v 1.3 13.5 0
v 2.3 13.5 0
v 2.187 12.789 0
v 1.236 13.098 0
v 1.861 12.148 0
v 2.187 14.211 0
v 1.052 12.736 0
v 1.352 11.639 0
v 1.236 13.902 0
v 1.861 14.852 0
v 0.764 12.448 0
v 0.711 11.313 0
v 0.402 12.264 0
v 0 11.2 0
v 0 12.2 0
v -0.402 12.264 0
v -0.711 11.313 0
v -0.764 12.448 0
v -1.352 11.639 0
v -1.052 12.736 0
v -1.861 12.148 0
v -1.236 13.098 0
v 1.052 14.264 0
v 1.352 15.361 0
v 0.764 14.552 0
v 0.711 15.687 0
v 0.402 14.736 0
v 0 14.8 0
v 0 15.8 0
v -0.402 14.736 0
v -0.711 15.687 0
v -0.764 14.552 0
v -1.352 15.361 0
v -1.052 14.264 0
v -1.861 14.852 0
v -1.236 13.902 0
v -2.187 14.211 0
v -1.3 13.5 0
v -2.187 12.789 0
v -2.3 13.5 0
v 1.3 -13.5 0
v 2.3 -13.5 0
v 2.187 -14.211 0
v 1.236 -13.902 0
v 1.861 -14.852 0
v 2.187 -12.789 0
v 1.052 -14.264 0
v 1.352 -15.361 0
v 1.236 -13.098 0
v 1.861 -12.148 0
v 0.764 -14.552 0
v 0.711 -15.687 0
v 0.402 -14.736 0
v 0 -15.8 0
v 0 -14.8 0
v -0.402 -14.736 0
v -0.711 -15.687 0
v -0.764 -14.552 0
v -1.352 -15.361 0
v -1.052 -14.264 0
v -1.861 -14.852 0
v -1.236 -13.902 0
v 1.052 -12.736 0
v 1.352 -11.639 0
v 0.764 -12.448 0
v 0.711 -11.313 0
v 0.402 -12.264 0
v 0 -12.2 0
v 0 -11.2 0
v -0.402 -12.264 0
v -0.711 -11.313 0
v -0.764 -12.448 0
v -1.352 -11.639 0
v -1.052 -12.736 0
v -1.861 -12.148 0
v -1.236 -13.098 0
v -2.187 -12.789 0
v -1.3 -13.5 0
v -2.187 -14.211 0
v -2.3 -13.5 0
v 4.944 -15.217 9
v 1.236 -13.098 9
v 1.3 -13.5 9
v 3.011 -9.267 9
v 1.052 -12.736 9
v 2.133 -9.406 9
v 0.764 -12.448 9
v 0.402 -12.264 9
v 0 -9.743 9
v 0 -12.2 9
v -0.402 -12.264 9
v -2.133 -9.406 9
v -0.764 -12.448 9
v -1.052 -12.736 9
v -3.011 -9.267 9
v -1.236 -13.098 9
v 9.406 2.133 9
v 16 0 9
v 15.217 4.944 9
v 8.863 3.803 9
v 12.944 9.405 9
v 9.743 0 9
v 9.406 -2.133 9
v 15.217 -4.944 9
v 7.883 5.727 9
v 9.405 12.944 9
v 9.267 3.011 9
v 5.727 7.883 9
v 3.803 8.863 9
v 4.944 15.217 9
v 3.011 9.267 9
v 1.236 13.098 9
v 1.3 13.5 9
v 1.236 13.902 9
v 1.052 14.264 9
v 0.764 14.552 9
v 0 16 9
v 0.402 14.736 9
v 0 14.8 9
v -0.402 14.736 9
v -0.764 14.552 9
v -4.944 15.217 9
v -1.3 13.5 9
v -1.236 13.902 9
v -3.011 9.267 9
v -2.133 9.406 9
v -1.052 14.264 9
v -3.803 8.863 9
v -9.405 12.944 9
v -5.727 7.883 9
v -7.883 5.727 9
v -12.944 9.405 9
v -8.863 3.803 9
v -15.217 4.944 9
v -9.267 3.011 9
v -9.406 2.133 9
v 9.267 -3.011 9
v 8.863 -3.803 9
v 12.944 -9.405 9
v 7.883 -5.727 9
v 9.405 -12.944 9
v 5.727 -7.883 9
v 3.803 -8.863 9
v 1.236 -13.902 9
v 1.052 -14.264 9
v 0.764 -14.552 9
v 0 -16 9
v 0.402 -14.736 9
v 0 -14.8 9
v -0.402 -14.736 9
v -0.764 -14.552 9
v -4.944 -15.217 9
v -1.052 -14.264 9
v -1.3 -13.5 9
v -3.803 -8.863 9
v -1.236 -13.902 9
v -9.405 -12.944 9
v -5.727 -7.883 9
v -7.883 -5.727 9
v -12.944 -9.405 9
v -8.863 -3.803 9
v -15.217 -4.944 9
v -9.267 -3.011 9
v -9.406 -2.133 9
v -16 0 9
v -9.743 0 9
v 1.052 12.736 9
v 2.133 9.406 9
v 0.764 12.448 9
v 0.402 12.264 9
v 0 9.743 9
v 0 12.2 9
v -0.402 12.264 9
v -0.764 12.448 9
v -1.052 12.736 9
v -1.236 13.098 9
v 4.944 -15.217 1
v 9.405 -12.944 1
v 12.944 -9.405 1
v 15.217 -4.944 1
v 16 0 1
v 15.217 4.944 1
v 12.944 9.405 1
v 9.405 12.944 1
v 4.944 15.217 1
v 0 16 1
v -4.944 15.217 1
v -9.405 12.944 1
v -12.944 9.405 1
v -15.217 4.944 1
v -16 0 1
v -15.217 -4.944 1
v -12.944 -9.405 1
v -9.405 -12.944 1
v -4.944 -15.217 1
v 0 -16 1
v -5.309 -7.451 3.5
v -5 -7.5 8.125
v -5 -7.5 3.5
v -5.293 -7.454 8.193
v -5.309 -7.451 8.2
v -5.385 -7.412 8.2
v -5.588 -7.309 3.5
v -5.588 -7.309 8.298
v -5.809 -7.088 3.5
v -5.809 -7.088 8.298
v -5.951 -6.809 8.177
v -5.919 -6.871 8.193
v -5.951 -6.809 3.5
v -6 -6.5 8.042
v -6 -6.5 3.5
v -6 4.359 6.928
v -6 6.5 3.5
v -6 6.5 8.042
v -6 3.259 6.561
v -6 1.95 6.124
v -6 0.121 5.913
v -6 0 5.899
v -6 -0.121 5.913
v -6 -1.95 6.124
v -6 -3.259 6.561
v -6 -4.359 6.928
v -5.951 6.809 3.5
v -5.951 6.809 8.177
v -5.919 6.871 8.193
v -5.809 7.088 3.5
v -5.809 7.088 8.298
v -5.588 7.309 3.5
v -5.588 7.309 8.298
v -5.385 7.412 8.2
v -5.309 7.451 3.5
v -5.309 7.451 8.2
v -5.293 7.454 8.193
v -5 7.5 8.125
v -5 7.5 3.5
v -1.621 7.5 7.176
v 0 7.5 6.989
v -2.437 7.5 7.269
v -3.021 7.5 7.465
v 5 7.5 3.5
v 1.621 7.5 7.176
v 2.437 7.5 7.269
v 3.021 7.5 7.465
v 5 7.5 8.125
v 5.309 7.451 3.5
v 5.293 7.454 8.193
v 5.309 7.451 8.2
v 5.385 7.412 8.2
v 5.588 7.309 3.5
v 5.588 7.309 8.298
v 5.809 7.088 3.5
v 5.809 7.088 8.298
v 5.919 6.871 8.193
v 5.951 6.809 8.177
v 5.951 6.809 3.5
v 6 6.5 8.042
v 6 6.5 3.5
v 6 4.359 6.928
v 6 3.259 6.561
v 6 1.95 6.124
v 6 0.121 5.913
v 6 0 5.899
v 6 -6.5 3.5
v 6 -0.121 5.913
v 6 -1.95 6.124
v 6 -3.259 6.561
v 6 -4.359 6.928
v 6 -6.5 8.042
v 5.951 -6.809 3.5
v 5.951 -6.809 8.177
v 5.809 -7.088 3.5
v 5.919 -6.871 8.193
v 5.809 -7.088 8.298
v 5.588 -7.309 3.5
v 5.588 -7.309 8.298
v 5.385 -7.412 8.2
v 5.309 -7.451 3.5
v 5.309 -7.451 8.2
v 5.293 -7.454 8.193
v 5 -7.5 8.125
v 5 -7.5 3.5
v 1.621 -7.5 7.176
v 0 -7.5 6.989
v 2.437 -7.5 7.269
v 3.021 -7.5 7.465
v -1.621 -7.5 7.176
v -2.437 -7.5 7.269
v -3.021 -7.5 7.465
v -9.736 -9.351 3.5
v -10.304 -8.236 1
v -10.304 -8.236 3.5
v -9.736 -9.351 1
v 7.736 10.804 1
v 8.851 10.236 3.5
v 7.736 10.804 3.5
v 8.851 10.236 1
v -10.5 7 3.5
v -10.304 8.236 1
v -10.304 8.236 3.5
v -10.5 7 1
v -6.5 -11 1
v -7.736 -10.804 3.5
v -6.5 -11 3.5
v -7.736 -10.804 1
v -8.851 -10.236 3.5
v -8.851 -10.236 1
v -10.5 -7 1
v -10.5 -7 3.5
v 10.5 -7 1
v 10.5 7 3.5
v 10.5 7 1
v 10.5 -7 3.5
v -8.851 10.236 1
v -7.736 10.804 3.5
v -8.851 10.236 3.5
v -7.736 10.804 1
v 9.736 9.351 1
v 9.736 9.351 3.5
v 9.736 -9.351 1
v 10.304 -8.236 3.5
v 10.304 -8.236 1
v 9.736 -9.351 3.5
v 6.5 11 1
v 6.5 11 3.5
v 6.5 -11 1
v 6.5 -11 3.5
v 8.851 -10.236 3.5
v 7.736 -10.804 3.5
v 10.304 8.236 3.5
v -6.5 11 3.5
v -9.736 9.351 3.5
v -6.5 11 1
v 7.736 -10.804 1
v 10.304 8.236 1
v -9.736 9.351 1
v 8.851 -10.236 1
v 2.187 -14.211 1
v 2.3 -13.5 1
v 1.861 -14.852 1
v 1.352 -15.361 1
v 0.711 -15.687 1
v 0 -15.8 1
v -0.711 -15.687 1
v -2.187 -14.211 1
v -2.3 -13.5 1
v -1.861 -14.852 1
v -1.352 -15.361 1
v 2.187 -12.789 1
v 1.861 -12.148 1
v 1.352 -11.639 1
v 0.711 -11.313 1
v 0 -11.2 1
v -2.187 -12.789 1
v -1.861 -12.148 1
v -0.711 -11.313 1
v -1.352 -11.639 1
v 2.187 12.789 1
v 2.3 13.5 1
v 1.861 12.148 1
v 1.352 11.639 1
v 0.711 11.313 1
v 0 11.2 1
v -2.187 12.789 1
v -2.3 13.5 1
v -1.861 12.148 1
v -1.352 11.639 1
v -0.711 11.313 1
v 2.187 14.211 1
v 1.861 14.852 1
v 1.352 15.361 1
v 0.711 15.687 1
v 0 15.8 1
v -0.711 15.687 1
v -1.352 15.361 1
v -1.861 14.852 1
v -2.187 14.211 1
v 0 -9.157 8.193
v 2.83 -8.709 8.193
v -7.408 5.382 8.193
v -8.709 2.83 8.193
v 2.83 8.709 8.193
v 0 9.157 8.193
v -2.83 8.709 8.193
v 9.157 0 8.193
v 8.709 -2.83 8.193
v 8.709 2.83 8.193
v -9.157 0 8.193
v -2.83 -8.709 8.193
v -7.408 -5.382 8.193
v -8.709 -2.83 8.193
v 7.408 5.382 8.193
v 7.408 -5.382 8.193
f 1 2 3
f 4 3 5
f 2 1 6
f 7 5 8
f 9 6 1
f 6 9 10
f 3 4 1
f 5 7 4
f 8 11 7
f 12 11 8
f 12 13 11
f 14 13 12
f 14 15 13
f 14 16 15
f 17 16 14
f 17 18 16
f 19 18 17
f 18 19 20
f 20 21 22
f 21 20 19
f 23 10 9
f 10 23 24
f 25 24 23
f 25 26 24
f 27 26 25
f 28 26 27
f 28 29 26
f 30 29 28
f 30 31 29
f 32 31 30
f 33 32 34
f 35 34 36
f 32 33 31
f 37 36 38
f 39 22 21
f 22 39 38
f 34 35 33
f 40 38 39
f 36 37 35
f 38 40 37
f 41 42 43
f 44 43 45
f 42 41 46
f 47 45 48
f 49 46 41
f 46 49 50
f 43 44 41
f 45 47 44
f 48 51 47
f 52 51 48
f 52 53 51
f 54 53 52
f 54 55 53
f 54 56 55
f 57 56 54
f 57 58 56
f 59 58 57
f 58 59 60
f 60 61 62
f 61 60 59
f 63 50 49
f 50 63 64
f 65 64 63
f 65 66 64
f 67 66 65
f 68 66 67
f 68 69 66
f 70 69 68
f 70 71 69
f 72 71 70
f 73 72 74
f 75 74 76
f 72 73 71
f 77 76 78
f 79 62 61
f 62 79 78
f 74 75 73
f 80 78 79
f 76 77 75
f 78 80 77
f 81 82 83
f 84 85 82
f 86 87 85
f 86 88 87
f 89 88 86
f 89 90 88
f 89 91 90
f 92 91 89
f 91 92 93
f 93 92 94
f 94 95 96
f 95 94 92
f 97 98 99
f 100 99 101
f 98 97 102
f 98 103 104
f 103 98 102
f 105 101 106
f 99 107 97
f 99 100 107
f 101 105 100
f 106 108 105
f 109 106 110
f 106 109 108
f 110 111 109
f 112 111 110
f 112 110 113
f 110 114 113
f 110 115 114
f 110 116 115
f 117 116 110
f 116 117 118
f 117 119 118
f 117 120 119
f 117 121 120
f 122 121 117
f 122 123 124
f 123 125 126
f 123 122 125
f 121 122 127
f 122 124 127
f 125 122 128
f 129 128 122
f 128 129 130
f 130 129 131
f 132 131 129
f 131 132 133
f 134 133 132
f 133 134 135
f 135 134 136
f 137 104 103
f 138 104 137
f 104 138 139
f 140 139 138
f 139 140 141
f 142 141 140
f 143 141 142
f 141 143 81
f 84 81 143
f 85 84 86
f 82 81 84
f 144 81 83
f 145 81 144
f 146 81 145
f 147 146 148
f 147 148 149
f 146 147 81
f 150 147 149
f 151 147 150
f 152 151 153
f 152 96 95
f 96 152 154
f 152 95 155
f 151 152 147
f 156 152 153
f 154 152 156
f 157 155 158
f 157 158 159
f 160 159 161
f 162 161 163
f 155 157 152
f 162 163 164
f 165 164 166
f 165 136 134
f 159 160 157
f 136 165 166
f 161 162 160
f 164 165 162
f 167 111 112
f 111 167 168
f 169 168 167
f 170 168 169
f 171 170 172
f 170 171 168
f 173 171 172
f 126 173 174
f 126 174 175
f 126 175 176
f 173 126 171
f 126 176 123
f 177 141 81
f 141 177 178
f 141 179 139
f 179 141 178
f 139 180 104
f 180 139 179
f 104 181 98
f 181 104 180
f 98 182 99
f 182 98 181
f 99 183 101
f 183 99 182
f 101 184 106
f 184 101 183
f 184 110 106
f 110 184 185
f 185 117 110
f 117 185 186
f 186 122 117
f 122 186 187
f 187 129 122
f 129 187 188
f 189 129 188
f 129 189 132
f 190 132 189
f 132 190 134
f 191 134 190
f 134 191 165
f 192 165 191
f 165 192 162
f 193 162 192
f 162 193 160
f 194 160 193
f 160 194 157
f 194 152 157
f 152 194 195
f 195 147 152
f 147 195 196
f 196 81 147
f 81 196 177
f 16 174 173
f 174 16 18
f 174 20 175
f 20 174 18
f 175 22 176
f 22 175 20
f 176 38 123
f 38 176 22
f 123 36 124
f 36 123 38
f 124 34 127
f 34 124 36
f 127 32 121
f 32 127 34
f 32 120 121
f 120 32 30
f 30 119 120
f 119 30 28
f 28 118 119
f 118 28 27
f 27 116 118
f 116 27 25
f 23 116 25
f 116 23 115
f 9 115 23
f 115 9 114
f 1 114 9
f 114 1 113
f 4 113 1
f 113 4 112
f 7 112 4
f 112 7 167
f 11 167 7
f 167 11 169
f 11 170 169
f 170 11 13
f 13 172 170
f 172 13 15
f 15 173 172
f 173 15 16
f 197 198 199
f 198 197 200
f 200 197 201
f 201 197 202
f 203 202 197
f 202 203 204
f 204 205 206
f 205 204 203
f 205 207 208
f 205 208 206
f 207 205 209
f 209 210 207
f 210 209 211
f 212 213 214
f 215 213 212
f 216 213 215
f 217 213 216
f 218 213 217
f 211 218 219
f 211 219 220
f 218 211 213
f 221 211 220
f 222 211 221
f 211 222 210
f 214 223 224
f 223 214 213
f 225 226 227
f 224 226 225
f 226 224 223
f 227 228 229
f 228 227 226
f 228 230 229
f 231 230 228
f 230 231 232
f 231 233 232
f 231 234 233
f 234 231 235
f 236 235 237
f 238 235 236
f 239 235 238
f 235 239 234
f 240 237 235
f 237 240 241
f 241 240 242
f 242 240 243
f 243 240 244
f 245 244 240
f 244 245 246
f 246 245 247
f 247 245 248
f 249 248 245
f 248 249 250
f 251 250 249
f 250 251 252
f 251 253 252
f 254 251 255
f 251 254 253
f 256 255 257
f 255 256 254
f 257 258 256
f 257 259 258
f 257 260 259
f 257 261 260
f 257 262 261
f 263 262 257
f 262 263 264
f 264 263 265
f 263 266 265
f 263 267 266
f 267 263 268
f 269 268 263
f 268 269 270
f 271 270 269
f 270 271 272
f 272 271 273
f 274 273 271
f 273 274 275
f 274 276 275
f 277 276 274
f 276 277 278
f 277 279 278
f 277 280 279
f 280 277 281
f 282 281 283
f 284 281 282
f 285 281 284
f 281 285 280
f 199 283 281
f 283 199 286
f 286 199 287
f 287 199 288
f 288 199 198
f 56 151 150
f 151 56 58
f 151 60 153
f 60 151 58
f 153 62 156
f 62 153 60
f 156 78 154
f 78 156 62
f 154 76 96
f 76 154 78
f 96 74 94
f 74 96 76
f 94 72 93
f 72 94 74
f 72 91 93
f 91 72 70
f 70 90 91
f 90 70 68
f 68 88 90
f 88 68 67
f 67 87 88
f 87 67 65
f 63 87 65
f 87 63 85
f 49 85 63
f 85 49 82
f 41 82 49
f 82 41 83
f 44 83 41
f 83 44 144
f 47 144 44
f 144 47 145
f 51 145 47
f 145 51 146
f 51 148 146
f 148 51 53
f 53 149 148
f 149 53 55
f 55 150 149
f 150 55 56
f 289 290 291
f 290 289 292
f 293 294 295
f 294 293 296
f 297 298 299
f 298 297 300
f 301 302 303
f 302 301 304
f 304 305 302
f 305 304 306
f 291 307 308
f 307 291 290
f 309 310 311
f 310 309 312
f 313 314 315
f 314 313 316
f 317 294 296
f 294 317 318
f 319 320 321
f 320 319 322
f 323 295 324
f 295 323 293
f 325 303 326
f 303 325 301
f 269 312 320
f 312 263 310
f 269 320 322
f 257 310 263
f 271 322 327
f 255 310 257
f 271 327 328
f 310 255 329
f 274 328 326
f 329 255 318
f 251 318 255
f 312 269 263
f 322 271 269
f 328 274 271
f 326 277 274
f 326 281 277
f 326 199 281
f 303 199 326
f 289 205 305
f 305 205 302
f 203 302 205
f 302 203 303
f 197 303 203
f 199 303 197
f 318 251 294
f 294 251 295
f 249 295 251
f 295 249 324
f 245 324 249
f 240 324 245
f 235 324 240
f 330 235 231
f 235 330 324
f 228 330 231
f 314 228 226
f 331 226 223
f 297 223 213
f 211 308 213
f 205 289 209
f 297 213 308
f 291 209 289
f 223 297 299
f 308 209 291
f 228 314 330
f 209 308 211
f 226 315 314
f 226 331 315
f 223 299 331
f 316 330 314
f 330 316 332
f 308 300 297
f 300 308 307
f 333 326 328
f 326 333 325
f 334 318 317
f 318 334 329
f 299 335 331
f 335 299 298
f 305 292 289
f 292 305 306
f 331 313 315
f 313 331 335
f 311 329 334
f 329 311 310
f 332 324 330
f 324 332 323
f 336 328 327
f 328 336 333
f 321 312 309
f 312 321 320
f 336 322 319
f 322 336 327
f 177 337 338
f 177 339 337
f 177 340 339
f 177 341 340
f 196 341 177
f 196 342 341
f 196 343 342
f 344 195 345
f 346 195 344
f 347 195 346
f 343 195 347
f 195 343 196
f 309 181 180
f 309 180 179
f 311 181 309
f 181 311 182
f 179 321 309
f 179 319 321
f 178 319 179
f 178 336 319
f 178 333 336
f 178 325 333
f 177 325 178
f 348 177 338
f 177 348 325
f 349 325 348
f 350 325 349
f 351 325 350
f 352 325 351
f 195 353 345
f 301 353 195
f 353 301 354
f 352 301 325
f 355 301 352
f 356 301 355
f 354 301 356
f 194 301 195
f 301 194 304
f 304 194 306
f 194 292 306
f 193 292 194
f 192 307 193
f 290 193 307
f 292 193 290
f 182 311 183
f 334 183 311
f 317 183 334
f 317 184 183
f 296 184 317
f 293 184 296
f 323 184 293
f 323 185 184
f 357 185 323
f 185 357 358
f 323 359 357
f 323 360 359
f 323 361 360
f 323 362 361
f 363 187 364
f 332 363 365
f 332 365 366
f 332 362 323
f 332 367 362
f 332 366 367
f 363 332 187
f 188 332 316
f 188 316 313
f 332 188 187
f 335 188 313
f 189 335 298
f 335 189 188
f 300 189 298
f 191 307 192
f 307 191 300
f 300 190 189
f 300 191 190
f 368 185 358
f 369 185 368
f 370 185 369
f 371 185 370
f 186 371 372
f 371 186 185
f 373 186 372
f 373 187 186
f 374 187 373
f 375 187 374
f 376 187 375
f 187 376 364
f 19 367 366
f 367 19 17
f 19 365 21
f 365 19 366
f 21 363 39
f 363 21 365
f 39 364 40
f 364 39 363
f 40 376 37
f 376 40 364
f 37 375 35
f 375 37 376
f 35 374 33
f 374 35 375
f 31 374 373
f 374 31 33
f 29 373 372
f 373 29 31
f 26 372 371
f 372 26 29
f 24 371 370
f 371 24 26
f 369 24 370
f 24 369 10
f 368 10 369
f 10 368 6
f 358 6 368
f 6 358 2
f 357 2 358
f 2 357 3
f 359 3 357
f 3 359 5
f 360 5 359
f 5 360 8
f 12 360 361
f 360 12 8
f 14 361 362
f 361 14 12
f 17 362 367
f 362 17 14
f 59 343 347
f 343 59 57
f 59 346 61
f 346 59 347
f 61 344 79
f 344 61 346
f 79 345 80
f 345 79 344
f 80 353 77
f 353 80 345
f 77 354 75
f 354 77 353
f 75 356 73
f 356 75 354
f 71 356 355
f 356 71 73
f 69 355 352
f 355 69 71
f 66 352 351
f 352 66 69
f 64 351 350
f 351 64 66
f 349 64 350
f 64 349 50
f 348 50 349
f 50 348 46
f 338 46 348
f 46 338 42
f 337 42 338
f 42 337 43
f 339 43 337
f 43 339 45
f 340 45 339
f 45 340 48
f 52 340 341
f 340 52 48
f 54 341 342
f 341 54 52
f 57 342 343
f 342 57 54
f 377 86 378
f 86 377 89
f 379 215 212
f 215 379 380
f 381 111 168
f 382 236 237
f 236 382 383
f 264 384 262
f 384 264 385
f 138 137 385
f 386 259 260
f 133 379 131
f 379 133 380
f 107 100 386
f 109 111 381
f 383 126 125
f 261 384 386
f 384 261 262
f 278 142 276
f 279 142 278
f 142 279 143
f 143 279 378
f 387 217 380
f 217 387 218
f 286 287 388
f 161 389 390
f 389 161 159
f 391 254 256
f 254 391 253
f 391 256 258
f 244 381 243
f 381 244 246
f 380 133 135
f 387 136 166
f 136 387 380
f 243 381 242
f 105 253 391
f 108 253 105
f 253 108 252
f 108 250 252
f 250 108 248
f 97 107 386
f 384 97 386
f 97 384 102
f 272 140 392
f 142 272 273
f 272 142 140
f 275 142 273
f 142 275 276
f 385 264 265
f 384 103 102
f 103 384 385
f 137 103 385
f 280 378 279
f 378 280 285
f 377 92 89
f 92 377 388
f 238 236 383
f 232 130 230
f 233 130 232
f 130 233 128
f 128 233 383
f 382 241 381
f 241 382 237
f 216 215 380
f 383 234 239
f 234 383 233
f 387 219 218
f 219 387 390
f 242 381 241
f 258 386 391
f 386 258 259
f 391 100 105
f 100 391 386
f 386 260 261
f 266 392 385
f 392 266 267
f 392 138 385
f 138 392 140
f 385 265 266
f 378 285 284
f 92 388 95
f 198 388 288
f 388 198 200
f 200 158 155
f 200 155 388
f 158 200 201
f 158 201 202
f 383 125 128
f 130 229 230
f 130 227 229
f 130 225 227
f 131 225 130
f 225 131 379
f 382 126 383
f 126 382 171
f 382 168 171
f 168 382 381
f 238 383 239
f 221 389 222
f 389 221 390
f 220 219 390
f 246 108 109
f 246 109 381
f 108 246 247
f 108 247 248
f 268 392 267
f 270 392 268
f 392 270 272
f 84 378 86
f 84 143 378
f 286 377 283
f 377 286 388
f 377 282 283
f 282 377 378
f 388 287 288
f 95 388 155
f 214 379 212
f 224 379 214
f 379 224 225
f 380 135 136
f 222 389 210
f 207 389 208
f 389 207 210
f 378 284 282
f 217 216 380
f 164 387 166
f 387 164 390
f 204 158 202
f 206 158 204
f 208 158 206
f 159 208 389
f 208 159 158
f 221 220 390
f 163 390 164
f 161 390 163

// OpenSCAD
// file: plate.scad
include <../config.scad>;

function getTrackballZ() = 
    -STANDOFF_HEIGHT +
    SENSOR_LENS_HEIGHT_ABOVE_BOARD +
    SENSOR_LENS_CLEARANCE +
    TRACKBALL_DIAMETER * 0.5;
    
function getTrackballHoleRadius() =
    sqrt(
        (TRACKBALL_DIAMETER * TRACKBALL_DIAMETER) / 4 -
        getTrackballZ() * getTrackballZ())
        + TRACKBALL_PLATE_CLEARANCE;

// draws a 2D circle representing a bolt hole
module boltHole(){
    circle(d = BOLT_DIAMETER + BOLT_TOLERENCE * 2);
}

// draws a 2D plate with the given key positions in 1U space
module plate(
    keyPositions = [],
    keyHeight = 1.0,
    boltPositions = [],
    cutHoles = true,
    hull = false){

    module solidPlate(){
        offset(delta = -PLATE_CURVE_RADIUS)
            for(keyPosition = keyPositions)
                translate([keyPosition.x, keyPosition.y * keyHeight] * 1U)

                    if(keyPosition.z == "adns" || keyPosition.z == "pmw")
                        translate([0.5, 0.5 * keyHeight] * 1U + [PLATE_BEZEL,PLATE_BEZEL])
                            offset(delta = TRACKBALL_PLATE_BEZEL)
                                circle(r = getTrackballHoleRadius());

                    else
                        square([1, keyHeight] * 1U + [1, 1] * PLATE_BEZEL * 2);
    }

    difference(){
        
        // outline
        minkowski() {
            if(hull)
                hull()
                    solidPlate();
            else
                solidPlate();
            
            circle(r = PLATE_CURVE_RADIUS);
        }
        
        // cutouts
        translate([PLATE_BEZEL, PLATE_BEZEL]){

            if(cutHoles){
                for(keyPosition = keyPositions)
                    translate([keyPosition.x + 0.5, (keyPosition.y + 0.5) * keyHeight] * 1U)

                    if(keyPosition.z == "adns" || keyPosition.z == "pmw")
                        circle(r = getTrackballHoleRadius());
                    else
                        translate(-[SWITCH_WIDTH, SWITCH_WIDTH] * 0.5)
                            square([SWITCH_WIDTH,SWITCH_WIDTH]);                        

                for(keyPosition = keyPositions){
                    translate([keyPosition.x + 0.5, (keyPosition.y + 0.5) * keyHeight] * 1U){
                        if(keyPosition.z == "adns" || keyPosition.z == "pmw"){
                            translate([0, SENSOR_PCB_MOUNT_OFFSET, 0])
                                boltHole();
                            translate([0, -SENSOR_PCB_MOUNT_OFFSET, 0])
                                boltHole();
                        }
                    }
                }

                for(boltPosition = boltPositions)
                    translate([boltPosition.x, boltPosition.y * keyHeight] * 1U)
                        boltHole();
            }
        }
    }
}

plate(
    keyPositions = FINGER_GRID,
    keyHeight = 1.0,
    boltPositions = FINGER_BOLT_HOLES,
    cutHoles = true,
    $fn = 100);
// file: shapes.scad
// draws a square with rounded corners
module squircle(
    size = [1,1],
    radius = 1,
    center = false){
    
    x = size[0];
    y = size[1];
    radius = min(x/2,min(y/2, radius));
    translation = [0,0];
        
    module corner(){
            intersection(){
                square([radius,radius]);
                translate([radius, radius])
                    circle(radius);
            }
    }
    
    module body(){
    
        corner();
        
        translate([0, y])        
            rotate([0,0,-90])
                corner();
        
        translate([x, y])        
            rotate([0,0,180])
                corner();
        
        translate([x, 0])        
            rotate([0,0, 90])
                corner();
        
        translate([radius, 0])
            square([x - 2 * radius, radius]);
        
        translate([0, radius])
            square([x, y - radius * 2]);
            
        translate([radius, y - radius])
            square([x - 2 * radius, radius]);
    }
    
    if(center)
        translate([-x/2, -y/2])
            body();
    else
        body();
}
// file: ../config.scad
// draw flags

DRAW_DEBUG = false;

// MX constants

1U = 19.05;
SWITCH_WIDTH = 14;

// hardware

NUT_DIAMETER = 4;
NUT_HEIGHT = 3;
NUT_TOLERENCE = 0.5;
BOLT_DIAMETER = 2.4; // M2 cleanance
BOLT_TOLERENCE = 0.1;
BOLT_TOP_DIAMETER = 3.8;
BOLT_TOP_HEIGHT = 2.5;
BOLT_LENGTH = 18;
THUMB_BOLT_LENGTH = 22;

BEARING_DIAMETER = 3.175;
BEARING_TOLERENCE = 0.05;

// plate

PLATE_THICKNESS = 1.5;
PLATE_BEZEL = 1;
PLATE_CURVE_RADIUS = 1;

// trackball

TRACKBALL_BOLT_HOLES_DIAMETER = 32;
TRACKBALL_DIAMETER = 24.9;
TRACKBALL_PLATE_CLEARANCE = 1.5;
TRACKBALL_PLATE_BEZEL = 7;
TRACKBALL_BEARING_MOUNT_CLEARANCE = 1.8;

// common sensor

SENSOR_CHANNEL_WIDTH = 12;
SENSOR_CHANNEL_HEIGHT = 15;
SENSOR_LENS_CLEARANCE = 1.4; // 2.4 from ADNS9800/PMW3600 data sheets, but needed a slight reduction, probably due to print tolerences
SENSOR_LENS_HEIGHT_ABOVE_BOARD = 3.5;
SENSOR_LENS_WIDTH = 21; 
SENSOR_LENS_HEIGHT = 22;
SENSOR_PCB_MOUNT_OFFSET = 13.5; // distance in X/Y from centre
SENSOR_PCB_THICKNESS = 1.5;
SENSOR_PCB_UNDERSIDE_CLEARANCE = 21.5;
SENDOR_TRACKBALL_CLEARANCE = 1;
STANDOFF_HEIGHT = 9;

// ADNS9800 sensor

ADNS_PCB_DIAMETER = 32;

// PMW3360 sensor

PMW_PCB_WIDTH = 21;
PMW_PCB_HEIGHT = 28;
PMW_PCB_MOUNT_OFFSET = 12;

// bearing mount

BEARING_OFFSET_Z = 3.8;
BEARING_MOUNT_TOP_CURVE_RADIUS = 1.2;
BEARING_MOUNT_TOP_X_MAX = 5;
BEARING_MOUNT_HEIGHT = 10;
BEARING_MOUNT_BOLT_TOP_CLEARANCE = 1.5;
BEARING_BOLT_CLEARANCE_Z = 1;

// PCB

MX_PCB_OFFSET = 5;
PCB_CURVE_RADIUS = 2;
PCB_PLATE_OFFSET_Z = MX_PCB_OFFSET - PLATE_THICKNESS;
PCB_THICKNESS = 1.6;
PCB_UNDERSIDE_CLEARANCE = 7;
PCB_CASE_CLEARANCE = 1;
PCB_SWITCH_OFFSET = 0;

PRO_MICRO_SIZE = [17.8, 33];
PRO_MICRO_USB_OVERHANG = 2;

MCU_PCB_OFFSET = 3.5; // socket or header height
MCU_PCB_THICKNESS = 1; // Elite C

// case

CASE_PLATE_BEZEL = 1;
CASE_PLATE_TOLERENCE = 0.25;
CASE_CURVE_RADIUS = 1;
CASE_PLATE_MOUNT_COVERAGE = 1;
CASE_BOLT_HOUSING_WIDTH = 1.5;
CASE_BOTTOM_THICKNESS = 2;
CASE_HEIGHT_ABOVE_PLATE = 0;
CASE_STANDOFF_FLANGED = true;

// case feet cutouts

FEET_DIAMETER = 8;
FEET_TOLERENCE = 1.25;
FEET_HEIGHT = 1;

// layouts in 1U space

FINGER_GRID = 
    [[0, 2], [1, 2], [2, 2.25], [3, 2.37], [4, 2.25], [5, 2.12],
     [0, 1], [1, 1], [2, 1.25], [3, 1.37], [4, 1.25], [5, 1.12],
     [0, 0], [1, 0], [2, 0.25], [3, 0.37], [4, 0.25], [5, 0.12]];

FINGER_BOLT_HOLES =
    [[1, 2], [5, 2.185],
     [1, 1], [5, 1.185]];

THUMB_GRID = [[0, 0], [1, 0.1]];

THUMB_BOLT_HOLES = 
    [[0.95, 0.925],
     [1.05, 0.175]];

THUMB_TRACKBALL_GRID = [[0, 0], [1.43, 0, "pmw" /* "adns" */ ]];

THUMB_TRACKBALL_BOLT_HOLES = 
    [[0.95, 0.925],
     [0.95, 0.075]];

FEET_POSITIONS =
    [[0.3, 2.75], [5.6, 2.85],
     [0.3, 0.3], [5.95, -1.1]];

THUMB_FEET_POSITIONS =
    [[0.3, 2.75], [5.6, 2.85],
     [0.3, 0.3], [6.45, -1.25]];

// plane rotations

HAND_ROTATION = [5, -8.5, 0];
THUMB_ROTATION = [10, -2, -10.25];
THUMB_OFFSET = [80.5, -22, 8.5];

// cutouts

USB_C_SIZE = [8.98, 9.20, 3.28];
USB_C_CUTOUT_TOLERENCE = 0.5;
USB_C_CUTOUT_OUTER_DELTA = 1.5;

TRRS_CUTOUT_SIZE = 5.5;
TRRS_CUTOUT_OUTER_DELTA = 5.5;
// main file
include <../config.scad>;
use <../modules/shapes.scad>;
use <../modules/plate.scad>;

module adnsCover(){
    difference(){
        linear_extrude(STANDOFF_HEIGHT)
            difference(){
                circle(d = ADNS_PCB_DIAMETER);
                
                // bolts cutouts

                translate([0, SENSOR_PCB_MOUNT_OFFSET])
                    circle(d = BOLT_DIAMETER + BOLT_TOLERENCE * 2);

                translate([0, -SENSOR_PCB_MOUNT_OFFSET])
                    circle(d = BOLT_DIAMETER + BOLT_TOLERENCE * 2);

                // laser channel
                squircle(
                    size = [SENSOR_CHANNEL_WIDTH, SENSOR_CHANNEL_HEIGHT],
                    radius = 1,
                    center = true);
            }
        
        // cutout for sensor
        linear_extrude(SENSOR_LENS_HEIGHT_ABOVE_BOARD)
            squircle(
                size = [SENSOR_LENS_WIDTH, SENSOR_LENS_HEIGHT],
                radius = 4,
                center = true);
                
        // cutout to expose bottom rings
        linear_extrude(1)
            difference(){
                circle(d = ADNS_PCB_DIAMETER);

                translate([0, SENSOR_PCB_MOUNT_OFFSET])
                    circle(d = BOLT_DIAMETER + BOLT_TOLERENCE * 2 + 2);

                translate([0, -SENSOR_PCB_MOUNT_OFFSET])
                    circle(d = BOLT_DIAMETER + BOLT_TOLERENCE * 2 + 2);
            }
            
        // cutout for trackball
        translate([0, 0, getTrackballZ() + STANDOFF_HEIGHT])
            sphere(d = TRACKBALL_DIAMETER + SENDOR_TRACKBALL_CLEARANCE);
    }    
}

adnsCover($fn = 20);
